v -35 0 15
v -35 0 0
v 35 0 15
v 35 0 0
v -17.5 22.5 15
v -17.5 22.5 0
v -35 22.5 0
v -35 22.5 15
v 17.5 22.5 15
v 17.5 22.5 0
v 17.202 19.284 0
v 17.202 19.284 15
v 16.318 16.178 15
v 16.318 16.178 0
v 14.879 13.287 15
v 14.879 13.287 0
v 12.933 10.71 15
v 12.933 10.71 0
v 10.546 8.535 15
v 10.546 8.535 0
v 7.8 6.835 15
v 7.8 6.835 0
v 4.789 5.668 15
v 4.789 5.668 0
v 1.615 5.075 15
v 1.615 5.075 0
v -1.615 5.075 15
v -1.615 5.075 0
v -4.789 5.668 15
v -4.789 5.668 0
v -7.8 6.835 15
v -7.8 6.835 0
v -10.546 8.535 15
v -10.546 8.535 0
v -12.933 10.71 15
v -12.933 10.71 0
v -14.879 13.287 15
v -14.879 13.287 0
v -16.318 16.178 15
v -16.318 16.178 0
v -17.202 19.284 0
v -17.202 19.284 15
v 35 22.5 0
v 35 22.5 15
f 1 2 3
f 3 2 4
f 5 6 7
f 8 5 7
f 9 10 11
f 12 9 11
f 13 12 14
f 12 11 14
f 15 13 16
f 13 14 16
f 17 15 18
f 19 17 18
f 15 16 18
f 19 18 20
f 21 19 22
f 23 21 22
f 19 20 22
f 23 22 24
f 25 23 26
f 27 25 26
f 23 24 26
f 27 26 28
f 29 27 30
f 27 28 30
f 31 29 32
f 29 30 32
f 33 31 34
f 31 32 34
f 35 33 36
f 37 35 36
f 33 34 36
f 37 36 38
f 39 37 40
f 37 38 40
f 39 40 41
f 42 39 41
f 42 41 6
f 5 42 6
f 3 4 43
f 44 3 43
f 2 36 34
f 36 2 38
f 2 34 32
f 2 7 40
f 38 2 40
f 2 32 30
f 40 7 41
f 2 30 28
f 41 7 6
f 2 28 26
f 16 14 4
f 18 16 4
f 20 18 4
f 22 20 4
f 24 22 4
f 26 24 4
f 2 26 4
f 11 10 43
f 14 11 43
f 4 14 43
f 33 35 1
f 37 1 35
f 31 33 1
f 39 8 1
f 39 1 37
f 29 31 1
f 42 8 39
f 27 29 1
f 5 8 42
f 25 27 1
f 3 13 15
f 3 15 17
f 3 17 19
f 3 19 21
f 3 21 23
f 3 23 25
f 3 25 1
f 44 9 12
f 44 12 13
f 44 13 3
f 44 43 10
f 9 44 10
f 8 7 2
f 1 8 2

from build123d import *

# Parameters (mm, degrees)
BOSS_EXTRUDE1_DEPTH = 15
SKETCH5_R           = 5
BOSS_EXTRUDE4_DEPTH = 22.5


with BuildPart() as part:
    # profiil → Boss-Extrude1 (new body)
    with BuildSketch(Plane.XY):
        with BuildLine():
            Line((35, 22.5), (17.5, 22.5))
            ThreePointArc((17.5, 22.5), (0, 5), (-17.5, 22.5))
            Line((-17.5, 22.5), (-35, 22.5))
            Line((-35, 22.5), (-35, 0))
            Line((-35, 0), (35, 0))
            Line((35, 0), (35, 22.5))
        make_face()
    extrude(amount=BOSS_EXTRUDE1_DEPTH)

    # Sketch5 → Boss-Extrude4 (add, through all)
    with BuildSketch(Plane(origin=(0, 0, 0), x_dir=(1, 0, 0), z_dir=(0, 1, 0))):
        with Locations((-25, -7.5)):
            Circle(SKETCH5_R)
        with Locations((25, -7.5)):
            Circle(SKETCH5_R)
    extrude(amount=BOSS_EXTRUDE4_DEPTH)


solid = part.part
